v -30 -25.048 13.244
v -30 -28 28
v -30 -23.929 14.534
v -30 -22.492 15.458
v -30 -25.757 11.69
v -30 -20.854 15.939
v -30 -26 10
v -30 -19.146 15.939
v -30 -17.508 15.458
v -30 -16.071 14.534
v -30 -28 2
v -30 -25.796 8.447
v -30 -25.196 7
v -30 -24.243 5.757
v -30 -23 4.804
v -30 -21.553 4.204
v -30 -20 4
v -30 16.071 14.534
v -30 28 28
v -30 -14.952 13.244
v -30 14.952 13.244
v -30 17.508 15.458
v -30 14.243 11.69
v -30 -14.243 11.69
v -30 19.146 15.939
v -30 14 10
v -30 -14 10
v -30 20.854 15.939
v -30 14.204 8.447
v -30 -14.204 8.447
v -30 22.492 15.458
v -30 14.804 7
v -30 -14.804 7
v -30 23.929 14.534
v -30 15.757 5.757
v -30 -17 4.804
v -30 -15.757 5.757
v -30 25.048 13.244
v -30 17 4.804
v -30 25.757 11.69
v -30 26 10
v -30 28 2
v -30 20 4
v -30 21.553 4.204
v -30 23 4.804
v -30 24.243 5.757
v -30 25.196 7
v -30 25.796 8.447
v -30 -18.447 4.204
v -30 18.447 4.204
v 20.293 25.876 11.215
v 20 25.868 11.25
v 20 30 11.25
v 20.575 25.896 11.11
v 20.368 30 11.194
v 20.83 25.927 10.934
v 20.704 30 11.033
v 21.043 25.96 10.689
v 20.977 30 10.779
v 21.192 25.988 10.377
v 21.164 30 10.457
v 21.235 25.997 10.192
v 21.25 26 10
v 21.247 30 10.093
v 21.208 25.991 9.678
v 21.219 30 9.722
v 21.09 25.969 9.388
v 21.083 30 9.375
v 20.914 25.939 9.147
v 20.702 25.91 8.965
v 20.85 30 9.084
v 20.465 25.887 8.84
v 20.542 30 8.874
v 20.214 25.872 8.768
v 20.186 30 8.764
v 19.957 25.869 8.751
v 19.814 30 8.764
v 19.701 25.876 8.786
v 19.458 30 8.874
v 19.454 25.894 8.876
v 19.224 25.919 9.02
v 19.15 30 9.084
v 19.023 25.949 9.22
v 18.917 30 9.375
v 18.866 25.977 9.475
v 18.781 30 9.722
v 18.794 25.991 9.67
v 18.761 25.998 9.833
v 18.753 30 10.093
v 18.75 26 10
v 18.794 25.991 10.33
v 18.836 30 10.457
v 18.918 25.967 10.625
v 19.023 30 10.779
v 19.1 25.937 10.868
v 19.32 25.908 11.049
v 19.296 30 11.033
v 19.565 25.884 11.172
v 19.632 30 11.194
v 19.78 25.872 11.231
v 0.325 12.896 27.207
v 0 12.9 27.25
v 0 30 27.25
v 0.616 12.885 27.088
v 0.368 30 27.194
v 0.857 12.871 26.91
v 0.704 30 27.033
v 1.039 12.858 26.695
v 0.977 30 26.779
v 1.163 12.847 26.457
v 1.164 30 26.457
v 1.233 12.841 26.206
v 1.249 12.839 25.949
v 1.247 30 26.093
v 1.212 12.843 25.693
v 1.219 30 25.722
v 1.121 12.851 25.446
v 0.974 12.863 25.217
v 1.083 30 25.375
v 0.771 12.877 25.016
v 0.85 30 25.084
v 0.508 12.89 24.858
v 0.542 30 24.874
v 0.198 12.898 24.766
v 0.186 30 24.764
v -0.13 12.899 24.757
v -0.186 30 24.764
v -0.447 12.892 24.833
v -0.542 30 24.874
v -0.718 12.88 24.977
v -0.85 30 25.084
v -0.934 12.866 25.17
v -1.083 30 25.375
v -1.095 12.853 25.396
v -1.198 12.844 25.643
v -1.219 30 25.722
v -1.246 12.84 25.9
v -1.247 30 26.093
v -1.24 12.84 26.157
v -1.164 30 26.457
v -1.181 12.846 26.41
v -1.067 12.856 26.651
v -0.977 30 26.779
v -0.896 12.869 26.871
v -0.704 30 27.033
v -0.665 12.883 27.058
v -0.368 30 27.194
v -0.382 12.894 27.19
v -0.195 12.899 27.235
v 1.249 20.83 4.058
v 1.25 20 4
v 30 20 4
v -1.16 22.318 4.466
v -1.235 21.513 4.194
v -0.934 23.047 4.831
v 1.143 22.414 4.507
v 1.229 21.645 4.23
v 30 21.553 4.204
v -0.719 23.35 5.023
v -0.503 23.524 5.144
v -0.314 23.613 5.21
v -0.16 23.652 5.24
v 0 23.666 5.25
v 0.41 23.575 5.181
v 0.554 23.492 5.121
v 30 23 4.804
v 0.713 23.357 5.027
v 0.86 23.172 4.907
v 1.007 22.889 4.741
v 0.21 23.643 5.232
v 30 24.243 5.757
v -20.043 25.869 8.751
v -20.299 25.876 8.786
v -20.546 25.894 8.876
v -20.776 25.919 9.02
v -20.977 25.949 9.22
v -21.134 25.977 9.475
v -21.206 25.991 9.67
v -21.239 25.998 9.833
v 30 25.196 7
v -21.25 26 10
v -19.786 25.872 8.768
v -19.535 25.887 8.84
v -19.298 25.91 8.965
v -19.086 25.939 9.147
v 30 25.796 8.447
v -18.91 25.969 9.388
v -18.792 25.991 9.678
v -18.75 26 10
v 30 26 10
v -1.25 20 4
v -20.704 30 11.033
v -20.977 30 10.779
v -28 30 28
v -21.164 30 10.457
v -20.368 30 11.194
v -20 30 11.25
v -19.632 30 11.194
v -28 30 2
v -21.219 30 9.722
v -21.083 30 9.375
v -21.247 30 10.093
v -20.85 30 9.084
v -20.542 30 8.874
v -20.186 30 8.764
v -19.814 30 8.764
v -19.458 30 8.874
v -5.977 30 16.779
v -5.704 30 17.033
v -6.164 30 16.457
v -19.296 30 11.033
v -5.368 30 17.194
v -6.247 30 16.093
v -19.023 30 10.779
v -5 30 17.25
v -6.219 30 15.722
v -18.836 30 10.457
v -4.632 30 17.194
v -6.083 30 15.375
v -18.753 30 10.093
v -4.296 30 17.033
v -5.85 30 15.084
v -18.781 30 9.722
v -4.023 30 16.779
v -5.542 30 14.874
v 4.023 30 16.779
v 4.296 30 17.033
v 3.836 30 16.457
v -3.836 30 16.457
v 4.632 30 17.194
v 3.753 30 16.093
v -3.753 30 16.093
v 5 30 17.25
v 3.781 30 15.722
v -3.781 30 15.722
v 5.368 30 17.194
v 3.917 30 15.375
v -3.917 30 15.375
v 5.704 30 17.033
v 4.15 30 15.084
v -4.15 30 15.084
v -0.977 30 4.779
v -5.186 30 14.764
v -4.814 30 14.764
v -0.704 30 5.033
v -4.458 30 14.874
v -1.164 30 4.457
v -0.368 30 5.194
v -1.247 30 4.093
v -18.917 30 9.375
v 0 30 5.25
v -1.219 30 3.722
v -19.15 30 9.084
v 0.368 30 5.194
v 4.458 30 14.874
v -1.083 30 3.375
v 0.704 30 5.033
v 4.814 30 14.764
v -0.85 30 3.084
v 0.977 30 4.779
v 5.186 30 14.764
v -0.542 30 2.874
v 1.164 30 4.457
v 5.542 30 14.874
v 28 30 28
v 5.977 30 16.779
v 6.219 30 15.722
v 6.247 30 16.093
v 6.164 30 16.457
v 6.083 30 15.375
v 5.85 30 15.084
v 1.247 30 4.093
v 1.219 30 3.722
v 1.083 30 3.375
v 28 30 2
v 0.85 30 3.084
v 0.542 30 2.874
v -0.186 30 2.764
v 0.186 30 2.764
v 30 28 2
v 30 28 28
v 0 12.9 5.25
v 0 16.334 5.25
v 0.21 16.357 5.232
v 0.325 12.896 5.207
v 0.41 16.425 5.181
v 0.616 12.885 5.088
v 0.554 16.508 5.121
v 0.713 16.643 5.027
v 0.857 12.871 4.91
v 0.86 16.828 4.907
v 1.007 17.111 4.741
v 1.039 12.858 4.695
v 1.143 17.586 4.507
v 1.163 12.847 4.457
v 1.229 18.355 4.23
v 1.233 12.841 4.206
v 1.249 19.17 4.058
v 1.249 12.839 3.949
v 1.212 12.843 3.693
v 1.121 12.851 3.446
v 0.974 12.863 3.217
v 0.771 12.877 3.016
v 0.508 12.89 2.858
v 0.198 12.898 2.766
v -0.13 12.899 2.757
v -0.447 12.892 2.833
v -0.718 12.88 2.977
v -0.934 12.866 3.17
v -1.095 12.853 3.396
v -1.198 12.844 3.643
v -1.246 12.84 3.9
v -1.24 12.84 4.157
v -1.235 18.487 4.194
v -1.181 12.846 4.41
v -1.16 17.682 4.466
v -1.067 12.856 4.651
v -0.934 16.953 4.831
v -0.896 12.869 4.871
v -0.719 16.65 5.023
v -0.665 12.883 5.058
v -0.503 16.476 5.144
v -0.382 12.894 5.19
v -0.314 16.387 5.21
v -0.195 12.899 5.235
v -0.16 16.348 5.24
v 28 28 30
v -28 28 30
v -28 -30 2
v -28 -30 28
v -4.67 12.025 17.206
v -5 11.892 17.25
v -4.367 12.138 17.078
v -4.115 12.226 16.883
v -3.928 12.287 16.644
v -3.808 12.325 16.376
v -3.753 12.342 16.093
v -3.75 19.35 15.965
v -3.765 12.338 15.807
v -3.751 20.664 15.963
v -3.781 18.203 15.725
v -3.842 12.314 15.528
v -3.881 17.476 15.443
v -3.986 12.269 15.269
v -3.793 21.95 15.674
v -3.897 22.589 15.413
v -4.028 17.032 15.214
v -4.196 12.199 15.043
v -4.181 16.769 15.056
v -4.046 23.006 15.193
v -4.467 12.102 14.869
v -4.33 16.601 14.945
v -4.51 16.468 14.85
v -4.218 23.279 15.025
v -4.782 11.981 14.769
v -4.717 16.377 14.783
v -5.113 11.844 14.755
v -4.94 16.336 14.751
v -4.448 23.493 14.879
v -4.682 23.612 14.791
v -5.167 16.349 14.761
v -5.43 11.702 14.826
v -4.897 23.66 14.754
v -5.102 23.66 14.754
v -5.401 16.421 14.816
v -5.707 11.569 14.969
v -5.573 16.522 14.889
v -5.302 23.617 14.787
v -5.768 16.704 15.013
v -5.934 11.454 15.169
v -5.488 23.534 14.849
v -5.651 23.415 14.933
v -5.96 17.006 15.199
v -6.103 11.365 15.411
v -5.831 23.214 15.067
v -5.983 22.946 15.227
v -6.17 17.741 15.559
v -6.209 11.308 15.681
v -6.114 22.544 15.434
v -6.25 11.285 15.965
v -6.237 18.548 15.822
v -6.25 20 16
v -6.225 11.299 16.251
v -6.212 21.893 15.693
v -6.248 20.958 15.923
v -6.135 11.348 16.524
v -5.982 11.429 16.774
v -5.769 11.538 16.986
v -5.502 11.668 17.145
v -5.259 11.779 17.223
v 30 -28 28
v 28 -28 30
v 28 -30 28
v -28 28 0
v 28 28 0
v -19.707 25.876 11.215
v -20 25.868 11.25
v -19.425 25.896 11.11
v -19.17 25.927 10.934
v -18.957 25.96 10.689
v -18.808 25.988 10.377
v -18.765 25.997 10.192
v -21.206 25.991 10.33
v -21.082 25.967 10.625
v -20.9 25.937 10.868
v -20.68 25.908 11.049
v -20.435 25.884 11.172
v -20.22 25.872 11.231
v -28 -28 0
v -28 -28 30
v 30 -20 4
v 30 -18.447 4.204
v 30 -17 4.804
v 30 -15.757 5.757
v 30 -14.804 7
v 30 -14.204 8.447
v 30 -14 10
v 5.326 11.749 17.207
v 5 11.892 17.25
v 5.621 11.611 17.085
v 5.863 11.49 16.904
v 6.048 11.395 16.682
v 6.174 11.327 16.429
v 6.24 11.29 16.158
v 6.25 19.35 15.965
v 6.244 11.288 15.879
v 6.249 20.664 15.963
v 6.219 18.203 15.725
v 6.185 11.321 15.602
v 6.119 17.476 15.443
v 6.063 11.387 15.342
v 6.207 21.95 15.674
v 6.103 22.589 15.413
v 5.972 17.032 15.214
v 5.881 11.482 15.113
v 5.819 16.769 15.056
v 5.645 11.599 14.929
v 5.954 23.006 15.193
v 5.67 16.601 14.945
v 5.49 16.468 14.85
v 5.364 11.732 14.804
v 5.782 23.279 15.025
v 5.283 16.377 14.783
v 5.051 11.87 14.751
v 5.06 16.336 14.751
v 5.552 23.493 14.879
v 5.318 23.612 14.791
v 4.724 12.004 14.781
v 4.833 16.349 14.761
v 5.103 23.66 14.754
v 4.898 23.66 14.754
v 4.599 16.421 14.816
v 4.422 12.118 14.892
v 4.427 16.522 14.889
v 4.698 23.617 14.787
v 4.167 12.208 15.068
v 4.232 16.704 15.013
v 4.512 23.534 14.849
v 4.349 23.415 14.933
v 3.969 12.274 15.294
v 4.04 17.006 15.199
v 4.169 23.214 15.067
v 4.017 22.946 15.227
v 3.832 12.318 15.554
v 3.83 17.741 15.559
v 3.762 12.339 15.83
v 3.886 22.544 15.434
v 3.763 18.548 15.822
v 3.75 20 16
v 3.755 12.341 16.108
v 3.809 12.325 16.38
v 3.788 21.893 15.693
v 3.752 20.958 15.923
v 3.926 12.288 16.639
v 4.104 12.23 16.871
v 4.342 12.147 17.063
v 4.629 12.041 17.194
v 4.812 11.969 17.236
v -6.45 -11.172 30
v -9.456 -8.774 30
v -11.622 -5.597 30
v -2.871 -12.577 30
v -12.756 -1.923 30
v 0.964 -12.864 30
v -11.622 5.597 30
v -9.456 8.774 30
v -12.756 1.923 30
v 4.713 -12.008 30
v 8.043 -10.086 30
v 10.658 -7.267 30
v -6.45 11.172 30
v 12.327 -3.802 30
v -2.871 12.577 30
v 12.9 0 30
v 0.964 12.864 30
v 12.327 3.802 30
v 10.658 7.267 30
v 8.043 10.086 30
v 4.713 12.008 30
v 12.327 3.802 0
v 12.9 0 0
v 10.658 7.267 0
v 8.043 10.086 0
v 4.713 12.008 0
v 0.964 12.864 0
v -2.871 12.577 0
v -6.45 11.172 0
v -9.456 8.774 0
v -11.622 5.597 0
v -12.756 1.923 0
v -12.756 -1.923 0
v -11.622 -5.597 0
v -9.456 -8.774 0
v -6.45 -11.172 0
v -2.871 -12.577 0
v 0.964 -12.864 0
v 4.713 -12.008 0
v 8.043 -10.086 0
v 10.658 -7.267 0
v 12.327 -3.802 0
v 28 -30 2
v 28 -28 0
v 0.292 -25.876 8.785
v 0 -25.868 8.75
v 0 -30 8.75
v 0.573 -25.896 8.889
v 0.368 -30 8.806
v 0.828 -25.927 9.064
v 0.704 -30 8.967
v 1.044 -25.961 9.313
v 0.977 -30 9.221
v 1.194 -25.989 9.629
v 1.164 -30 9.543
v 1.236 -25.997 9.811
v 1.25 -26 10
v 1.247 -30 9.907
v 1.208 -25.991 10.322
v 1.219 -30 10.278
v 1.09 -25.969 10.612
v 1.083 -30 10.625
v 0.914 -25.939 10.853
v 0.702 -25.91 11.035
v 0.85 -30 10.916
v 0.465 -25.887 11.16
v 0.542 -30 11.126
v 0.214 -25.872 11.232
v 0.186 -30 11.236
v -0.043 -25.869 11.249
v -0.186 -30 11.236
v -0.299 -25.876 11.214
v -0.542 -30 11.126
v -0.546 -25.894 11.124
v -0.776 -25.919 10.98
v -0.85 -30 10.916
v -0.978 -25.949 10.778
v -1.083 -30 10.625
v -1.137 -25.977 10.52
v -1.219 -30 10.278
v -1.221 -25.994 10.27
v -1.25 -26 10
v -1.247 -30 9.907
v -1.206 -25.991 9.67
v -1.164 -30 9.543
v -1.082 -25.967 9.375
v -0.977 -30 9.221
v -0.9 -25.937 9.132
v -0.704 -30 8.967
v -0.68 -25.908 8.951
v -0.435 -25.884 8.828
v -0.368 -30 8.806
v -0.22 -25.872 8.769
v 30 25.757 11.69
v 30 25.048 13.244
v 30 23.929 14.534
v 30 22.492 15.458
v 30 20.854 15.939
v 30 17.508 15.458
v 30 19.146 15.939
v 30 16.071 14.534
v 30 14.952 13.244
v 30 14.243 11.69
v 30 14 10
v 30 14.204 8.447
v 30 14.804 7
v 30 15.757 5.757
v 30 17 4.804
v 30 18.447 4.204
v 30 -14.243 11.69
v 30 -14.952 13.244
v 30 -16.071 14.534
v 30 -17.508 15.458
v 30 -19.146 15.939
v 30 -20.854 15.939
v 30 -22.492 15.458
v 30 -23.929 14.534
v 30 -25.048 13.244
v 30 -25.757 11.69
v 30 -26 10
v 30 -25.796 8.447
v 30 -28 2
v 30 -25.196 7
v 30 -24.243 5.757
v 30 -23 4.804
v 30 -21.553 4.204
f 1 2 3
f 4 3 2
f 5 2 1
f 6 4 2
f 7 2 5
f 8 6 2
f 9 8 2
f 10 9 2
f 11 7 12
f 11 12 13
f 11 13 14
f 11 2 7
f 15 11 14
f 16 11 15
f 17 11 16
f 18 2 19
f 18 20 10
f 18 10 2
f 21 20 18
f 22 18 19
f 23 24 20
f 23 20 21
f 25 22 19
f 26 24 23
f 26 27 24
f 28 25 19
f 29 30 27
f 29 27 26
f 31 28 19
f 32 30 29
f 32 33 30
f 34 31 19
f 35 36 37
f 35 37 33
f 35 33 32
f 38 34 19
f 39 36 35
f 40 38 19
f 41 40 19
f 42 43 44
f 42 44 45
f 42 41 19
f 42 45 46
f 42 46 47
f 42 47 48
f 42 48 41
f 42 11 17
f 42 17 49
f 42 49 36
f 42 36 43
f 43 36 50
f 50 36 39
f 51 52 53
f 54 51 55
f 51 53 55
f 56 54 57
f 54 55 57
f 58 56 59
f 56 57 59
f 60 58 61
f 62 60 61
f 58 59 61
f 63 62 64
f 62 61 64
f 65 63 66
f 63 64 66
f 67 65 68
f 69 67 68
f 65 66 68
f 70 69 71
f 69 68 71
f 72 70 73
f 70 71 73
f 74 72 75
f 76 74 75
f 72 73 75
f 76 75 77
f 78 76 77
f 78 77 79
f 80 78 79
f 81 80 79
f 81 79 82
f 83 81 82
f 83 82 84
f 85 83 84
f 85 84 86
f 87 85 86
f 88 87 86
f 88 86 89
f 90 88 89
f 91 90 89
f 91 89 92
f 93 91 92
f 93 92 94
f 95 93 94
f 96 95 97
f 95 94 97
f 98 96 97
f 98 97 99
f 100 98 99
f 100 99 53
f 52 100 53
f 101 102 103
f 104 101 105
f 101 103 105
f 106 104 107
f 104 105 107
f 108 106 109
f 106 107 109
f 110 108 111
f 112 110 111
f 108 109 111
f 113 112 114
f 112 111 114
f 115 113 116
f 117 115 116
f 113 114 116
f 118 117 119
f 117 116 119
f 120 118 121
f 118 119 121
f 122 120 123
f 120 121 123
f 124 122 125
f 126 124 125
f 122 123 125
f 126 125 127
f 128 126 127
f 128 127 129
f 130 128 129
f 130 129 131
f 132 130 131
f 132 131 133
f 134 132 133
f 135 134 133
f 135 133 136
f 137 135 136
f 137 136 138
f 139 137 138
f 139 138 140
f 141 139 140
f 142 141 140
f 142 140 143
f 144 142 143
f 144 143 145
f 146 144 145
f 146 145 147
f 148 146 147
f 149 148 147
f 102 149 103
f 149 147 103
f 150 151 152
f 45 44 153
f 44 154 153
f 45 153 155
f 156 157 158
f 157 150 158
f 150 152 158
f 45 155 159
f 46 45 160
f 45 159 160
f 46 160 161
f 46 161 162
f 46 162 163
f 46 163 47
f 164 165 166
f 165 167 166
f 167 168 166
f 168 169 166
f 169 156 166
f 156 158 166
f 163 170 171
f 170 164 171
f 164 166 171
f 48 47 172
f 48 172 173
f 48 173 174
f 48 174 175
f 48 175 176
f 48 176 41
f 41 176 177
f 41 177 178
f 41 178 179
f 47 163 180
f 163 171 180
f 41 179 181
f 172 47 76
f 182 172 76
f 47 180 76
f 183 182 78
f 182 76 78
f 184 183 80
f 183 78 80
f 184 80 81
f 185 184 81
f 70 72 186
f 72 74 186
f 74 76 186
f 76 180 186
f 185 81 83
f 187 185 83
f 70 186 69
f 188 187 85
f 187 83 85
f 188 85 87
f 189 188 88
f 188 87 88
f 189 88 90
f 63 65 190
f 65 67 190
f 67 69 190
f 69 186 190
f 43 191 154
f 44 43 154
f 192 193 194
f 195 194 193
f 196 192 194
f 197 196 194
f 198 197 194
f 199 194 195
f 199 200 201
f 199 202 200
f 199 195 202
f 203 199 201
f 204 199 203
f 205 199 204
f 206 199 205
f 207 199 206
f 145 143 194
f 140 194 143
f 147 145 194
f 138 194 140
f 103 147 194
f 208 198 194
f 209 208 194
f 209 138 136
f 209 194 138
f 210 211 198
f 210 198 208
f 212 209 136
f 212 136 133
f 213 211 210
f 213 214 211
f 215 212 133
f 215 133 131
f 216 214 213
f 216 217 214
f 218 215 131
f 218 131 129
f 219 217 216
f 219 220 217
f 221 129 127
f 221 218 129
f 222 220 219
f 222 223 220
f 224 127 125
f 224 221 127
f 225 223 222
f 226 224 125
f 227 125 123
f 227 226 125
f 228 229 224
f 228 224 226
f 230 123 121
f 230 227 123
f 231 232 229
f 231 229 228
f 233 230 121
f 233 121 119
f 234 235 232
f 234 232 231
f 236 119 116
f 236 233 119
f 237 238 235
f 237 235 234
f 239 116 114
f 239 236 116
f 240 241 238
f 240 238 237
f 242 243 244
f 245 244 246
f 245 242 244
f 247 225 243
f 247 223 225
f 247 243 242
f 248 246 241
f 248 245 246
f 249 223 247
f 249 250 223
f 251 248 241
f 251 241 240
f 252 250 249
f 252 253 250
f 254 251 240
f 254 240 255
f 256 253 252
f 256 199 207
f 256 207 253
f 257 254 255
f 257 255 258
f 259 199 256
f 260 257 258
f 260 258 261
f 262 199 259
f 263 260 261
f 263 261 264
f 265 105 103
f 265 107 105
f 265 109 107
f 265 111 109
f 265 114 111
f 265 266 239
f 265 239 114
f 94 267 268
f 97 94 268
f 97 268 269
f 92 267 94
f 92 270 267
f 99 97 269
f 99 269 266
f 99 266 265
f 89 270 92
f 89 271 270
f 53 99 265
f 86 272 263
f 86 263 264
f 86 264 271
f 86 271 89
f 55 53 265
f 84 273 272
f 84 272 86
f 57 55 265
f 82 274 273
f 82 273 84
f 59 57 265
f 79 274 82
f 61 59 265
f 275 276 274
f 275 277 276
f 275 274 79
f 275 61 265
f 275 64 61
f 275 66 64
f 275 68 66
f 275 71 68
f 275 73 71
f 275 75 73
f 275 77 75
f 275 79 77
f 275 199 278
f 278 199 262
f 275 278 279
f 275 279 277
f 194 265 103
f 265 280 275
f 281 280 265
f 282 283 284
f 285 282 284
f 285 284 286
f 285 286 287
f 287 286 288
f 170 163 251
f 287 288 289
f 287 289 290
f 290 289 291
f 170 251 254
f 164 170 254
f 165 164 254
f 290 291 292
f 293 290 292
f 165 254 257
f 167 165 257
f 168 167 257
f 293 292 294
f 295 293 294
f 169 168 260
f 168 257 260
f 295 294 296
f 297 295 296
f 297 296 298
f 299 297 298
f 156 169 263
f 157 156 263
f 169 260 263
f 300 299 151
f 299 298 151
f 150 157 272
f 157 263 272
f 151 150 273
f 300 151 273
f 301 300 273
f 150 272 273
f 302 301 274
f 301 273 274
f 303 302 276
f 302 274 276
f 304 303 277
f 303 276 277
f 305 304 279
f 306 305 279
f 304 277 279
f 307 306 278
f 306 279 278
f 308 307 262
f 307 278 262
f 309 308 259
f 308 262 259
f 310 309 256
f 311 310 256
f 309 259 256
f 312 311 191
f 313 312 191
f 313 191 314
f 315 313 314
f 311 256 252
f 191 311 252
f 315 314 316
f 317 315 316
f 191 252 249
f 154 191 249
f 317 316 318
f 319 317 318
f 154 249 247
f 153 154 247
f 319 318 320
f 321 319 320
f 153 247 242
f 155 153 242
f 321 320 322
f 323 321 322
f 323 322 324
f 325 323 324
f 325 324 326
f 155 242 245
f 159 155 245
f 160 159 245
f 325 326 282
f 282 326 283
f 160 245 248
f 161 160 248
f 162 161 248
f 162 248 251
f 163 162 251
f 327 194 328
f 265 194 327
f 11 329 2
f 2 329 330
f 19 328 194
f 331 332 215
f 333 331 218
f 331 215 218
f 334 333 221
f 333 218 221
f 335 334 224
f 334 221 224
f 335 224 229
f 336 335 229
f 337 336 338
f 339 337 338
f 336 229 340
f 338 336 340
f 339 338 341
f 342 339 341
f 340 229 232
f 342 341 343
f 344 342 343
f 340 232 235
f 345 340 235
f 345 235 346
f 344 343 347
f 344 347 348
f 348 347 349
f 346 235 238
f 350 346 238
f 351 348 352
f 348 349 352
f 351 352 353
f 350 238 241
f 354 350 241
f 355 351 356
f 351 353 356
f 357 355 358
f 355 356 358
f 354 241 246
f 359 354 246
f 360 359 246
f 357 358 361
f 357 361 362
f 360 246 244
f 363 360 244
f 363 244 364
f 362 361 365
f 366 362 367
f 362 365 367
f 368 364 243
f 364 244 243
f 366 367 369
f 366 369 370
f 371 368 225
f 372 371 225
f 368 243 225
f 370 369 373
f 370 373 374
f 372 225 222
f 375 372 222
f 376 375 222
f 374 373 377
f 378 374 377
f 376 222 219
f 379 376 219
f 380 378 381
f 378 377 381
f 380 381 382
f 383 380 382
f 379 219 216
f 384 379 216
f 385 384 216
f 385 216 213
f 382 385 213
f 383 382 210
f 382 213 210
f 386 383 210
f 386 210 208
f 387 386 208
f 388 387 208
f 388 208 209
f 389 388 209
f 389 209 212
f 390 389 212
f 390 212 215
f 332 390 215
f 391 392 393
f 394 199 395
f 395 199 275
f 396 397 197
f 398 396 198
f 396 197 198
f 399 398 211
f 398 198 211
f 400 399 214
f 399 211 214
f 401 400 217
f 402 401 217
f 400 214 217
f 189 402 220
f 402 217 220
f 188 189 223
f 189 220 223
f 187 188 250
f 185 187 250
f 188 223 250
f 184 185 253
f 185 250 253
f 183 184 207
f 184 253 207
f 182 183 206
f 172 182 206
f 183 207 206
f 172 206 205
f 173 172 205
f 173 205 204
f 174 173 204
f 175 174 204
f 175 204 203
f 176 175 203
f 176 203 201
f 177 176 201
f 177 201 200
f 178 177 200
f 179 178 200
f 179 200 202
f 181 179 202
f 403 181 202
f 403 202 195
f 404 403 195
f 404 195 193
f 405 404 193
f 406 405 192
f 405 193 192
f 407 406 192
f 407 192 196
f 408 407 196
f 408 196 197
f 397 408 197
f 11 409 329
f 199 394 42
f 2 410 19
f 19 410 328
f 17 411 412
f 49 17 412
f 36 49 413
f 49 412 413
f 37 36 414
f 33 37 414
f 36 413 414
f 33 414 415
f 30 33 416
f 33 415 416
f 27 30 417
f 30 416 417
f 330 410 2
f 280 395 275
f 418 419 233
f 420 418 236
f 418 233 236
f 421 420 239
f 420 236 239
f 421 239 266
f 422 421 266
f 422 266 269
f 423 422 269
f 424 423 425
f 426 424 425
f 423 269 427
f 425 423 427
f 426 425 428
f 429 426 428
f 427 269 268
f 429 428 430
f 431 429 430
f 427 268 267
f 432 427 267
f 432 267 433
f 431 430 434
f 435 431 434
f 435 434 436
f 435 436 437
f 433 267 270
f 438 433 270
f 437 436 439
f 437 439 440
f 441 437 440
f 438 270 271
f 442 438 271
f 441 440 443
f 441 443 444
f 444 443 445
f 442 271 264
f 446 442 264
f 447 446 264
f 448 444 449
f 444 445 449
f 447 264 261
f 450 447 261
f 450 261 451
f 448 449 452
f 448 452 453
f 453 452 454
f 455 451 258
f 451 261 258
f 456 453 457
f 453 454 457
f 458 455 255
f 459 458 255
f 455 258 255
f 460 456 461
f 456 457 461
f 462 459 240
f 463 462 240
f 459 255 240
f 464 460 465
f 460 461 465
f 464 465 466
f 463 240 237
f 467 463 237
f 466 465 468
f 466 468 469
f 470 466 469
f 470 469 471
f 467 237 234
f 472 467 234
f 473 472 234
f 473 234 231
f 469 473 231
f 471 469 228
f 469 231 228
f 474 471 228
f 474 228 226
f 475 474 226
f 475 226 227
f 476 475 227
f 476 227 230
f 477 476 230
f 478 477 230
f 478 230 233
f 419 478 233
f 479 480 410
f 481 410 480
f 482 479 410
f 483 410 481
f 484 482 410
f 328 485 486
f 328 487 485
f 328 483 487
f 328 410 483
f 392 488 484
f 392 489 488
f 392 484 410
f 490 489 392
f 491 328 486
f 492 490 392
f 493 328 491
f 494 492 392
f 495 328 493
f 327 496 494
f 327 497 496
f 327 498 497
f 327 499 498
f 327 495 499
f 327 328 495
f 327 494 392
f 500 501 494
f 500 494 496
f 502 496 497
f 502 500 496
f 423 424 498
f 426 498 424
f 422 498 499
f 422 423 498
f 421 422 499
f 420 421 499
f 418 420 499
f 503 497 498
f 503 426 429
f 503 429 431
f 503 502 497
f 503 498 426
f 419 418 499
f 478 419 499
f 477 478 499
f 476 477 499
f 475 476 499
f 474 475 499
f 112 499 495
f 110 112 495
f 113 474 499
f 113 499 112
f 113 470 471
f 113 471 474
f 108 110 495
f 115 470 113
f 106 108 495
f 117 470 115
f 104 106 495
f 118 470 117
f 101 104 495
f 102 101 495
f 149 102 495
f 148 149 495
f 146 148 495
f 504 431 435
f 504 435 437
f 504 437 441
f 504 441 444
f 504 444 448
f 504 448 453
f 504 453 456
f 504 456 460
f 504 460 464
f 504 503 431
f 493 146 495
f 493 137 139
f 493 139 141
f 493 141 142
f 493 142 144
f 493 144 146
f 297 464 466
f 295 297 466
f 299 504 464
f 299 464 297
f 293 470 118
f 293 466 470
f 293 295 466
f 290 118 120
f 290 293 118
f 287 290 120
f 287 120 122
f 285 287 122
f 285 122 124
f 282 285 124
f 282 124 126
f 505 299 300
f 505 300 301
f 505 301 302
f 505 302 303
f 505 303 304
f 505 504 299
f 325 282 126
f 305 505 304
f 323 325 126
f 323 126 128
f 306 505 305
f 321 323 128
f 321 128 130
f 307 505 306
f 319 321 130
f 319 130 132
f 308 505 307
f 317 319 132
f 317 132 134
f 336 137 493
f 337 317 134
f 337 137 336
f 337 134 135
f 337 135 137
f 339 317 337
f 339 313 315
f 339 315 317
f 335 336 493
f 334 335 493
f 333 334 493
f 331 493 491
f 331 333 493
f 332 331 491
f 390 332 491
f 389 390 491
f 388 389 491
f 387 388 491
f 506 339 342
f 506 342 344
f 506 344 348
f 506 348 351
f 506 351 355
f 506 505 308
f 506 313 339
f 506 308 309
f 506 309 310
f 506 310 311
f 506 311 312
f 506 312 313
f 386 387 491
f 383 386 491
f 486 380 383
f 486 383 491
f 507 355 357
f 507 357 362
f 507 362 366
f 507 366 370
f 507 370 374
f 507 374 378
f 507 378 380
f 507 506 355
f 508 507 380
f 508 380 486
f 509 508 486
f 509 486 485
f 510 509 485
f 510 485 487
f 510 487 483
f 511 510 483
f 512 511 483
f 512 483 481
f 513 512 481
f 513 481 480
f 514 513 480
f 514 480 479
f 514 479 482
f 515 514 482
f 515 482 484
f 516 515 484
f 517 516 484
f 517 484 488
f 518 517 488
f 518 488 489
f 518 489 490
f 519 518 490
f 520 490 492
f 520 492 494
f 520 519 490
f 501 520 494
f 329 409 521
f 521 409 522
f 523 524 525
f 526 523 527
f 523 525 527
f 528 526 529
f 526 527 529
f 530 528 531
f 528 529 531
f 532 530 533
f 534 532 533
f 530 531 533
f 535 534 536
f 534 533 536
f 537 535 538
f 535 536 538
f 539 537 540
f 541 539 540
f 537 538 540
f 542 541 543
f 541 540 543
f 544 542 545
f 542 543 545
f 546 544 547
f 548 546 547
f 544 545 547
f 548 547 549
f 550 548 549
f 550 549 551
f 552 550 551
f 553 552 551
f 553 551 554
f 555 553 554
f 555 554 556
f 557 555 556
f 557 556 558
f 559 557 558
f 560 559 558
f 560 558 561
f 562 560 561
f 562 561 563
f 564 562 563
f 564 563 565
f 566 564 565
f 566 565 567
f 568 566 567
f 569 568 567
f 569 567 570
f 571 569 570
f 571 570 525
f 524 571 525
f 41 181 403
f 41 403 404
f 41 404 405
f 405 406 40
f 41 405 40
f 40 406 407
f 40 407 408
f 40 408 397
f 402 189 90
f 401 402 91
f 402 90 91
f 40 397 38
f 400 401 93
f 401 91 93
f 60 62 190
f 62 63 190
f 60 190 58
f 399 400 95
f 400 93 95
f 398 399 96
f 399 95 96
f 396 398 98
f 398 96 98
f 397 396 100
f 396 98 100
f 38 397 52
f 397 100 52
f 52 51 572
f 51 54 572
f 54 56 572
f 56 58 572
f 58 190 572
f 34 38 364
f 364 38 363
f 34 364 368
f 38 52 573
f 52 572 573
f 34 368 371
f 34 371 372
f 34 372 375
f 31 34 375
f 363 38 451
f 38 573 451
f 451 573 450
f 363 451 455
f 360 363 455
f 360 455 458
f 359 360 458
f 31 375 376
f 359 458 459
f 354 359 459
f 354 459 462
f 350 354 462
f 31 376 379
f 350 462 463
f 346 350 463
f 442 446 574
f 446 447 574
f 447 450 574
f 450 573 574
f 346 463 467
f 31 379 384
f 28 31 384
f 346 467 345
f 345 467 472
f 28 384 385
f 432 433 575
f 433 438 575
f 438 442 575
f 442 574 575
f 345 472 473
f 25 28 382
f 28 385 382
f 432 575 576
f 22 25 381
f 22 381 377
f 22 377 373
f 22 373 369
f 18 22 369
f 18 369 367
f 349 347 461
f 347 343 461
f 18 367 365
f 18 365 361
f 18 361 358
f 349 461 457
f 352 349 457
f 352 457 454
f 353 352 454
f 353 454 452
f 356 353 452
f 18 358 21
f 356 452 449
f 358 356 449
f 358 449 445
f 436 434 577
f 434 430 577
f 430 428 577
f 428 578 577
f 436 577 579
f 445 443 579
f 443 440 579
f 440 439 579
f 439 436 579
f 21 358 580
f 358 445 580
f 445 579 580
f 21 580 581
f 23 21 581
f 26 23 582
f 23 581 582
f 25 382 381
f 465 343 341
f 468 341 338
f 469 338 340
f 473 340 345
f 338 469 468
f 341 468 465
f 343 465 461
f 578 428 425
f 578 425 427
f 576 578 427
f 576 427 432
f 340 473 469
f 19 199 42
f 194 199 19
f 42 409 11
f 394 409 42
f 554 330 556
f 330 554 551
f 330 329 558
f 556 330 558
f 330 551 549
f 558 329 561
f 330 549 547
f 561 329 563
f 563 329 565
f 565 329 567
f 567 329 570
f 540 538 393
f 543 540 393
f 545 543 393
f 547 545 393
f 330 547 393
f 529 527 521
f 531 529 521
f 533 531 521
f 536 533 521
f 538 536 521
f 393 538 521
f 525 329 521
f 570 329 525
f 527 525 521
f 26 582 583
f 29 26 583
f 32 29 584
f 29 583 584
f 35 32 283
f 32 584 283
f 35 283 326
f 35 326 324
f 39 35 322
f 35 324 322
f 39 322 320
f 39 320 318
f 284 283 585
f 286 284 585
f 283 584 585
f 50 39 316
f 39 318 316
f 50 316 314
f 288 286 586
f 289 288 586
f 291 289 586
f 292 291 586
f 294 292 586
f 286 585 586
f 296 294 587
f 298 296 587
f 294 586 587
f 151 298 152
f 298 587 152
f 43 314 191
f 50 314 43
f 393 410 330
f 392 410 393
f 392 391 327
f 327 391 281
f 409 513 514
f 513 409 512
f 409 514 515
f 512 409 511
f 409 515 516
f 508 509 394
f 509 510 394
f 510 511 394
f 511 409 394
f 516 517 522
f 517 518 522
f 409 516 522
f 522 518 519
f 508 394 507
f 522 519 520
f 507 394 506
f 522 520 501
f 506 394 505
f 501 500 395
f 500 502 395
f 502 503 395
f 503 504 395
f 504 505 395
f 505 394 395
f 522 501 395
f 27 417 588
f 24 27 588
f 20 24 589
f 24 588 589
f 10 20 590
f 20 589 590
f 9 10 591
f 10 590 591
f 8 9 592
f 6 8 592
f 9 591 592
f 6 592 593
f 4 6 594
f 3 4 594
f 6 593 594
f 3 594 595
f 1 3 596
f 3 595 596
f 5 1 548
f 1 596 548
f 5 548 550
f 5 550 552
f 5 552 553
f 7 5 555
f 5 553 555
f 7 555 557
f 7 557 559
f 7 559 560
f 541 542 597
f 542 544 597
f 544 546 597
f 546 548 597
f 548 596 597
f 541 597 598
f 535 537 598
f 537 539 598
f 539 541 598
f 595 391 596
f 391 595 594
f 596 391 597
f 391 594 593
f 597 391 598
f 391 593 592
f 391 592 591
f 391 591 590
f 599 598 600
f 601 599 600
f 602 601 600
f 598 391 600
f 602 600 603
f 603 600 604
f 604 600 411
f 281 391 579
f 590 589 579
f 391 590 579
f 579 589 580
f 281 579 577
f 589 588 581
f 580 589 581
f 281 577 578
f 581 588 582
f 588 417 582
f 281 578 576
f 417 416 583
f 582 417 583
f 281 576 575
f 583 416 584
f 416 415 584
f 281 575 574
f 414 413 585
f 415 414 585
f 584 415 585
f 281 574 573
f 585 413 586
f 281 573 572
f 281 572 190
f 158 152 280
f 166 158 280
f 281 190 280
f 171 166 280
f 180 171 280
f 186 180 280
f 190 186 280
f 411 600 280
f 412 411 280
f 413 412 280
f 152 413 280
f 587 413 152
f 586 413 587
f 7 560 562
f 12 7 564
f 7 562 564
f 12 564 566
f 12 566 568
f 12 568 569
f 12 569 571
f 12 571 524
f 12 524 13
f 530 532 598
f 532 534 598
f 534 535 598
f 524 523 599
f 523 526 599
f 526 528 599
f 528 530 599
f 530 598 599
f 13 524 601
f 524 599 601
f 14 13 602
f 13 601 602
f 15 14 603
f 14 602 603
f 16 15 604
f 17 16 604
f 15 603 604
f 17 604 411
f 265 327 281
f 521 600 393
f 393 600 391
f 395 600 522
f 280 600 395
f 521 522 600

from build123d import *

# Parameters (mm, degrees)
SKETCH1_W           = 60
SKETCH1_H           = 60
SKETCH1_R           = 12.9
BOSS_EXTRUDE1_DEPTH = 30
CUT_EXTRUDE1_DEPTH  = 70
SKETCH3_R           = 1.25
CUT_EXTRUDE2_DEPTH  = 10
SKETCH4_R           = 1.25
CUT_EXTRUDE3_DEPTH  = 30
SKETCH5_R           = 1.25
CUT_EXTRUDE4_DEPTH  = 30
SKETCH6_R           = 1.25
CUT_EXTRUDE5_DEPTH  = 10
CHAMFER2_SIZE       = 2


with BuildPart() as part:
    # Sketch1 → Boss-Extrude1 (new body)
    with BuildSketch(Plane.XY):
        Rectangle(SKETCH1_W, SKETCH1_H)
        Circle(SKETCH1_R, mode=Mode.SUBTRACT)
    extrude(amount=BOSS_EXTRUDE1_DEPTH)

    # Sketch2 → Cut-Extrude1 (cut)
    with BuildSketch(Plane(origin=(30, 0, 0), x_dir=(0, 0, -1), z_dir=(1, 0, 0))):
        with BuildLine():
            ThreePointArc((-4, 20), (-5.757359313, 24.242640687), (-10, 26))
            Line((-10, 26), (-10, 14))
            ThreePointArc((-10, 14), (-5.757359313, 15.757359313), (-4, 20))
        make_face()
        with BuildLine():
            Line((-10, 14), (-10, 26))
            ThreePointArc((-10, 26), (-16, 20), (-10, 14))
        make_face()
        with BuildLine():
            ThreePointArc((-4, -20), (-5.757359313, -15.757359313), (-10, -14))
            Line((-10, -14), (-10, -26))
            ThreePointArc((-10, -26), (-5.757359313, -24.242640687), (-4, -20))
        make_face()
        with BuildLine():
            Line((-10, -26), (-10, -14))
            ThreePointArc((-10, -14), (-16, -20), (-10, -26))
        make_face()
    extrude(amount=-CUT_EXTRUDE1_DEPTH, mode=Mode.SUBTRACT)

    # Sketch3 → Cut-Extrude2 (cut)
    with BuildSketch(Plane(origin=(0, 30, 0), x_dir=(1, 0, 0), z_dir=(0, 1, 0))):
        with Locations(Location((-20, -10, 0), (0, 0, 270))):
            Circle(SKETCH3_R)
        with Locations(Location((20, -10, 0), (0, 0, 270))):
            Circle(SKETCH3_R)
    extrude(amount=-CUT_EXTRUDE2_DEPTH, mode=Mode.SUBTRACT)

    # Sketch4 → Cut-Extrude3 (cut)
    with BuildSketch(Plane(origin=(0, 30, 0), x_dir=(1, 0, 0), z_dir=(0, 1, 0))):
        with Locations(Location((-5, -16, 0), (0, 0, 270))):
            Circle(SKETCH4_R)
        with Locations(Location((5, -16, 0), (0, 0, 270))):
            Circle(SKETCH4_R)
    extrude(amount=-CUT_EXTRUDE3_DEPTH, mode=Mode.SUBTRACT)

    # Sketch5 → Cut-Extrude4 (cut)
    with BuildSketch(Plane(origin=(0, 30, 0), x_dir=(1, 0, 0), z_dir=(0, 1, 0))):
        with Locations(Location((0, -4, 0), (0, 0, 270))):
            Circle(SKETCH5_R)
        with Locations(Location((0, -26, 0), (0, 0, 270))):
            Circle(SKETCH5_R)
    extrude(amount=-CUT_EXTRUDE4_DEPTH, mode=Mode.SUBTRACT)

    # Sketch6 → Cut-Extrude5 (cut)
    with BuildSketch(Plane(origin=(0, -30, 0), x_dir=(-1, 0, 0), z_dir=(0, -1, 0))):
        with Locations(Location((0, -10, 0), (0, 0, 90))):
            Circle(SKETCH6_R)
    extrude(amount=-CUT_EXTRUDE5_DEPTH, mode=Mode.SUBTRACT)

    # Chamfer2
    chamfer2_edges = [part.edges().sort_by_distance(p)[0] for p in [
        (-30, 0, 30),
        (0, -30, 30),
        (30, 0, 30),
        (0, -30, 0),
        (-30, 0, 0),
        (0, 30, 0),
        (30, 0, 0),
        (0, 30, 30),
        (30, -30, 15),
        (-30, -30, 15),
        (-30, 30, 15),
        (30, 30, 15),
    ]]
    chamfer(chamfer2_edges, length=CHAMFER2_SIZE)


solid = part.part
